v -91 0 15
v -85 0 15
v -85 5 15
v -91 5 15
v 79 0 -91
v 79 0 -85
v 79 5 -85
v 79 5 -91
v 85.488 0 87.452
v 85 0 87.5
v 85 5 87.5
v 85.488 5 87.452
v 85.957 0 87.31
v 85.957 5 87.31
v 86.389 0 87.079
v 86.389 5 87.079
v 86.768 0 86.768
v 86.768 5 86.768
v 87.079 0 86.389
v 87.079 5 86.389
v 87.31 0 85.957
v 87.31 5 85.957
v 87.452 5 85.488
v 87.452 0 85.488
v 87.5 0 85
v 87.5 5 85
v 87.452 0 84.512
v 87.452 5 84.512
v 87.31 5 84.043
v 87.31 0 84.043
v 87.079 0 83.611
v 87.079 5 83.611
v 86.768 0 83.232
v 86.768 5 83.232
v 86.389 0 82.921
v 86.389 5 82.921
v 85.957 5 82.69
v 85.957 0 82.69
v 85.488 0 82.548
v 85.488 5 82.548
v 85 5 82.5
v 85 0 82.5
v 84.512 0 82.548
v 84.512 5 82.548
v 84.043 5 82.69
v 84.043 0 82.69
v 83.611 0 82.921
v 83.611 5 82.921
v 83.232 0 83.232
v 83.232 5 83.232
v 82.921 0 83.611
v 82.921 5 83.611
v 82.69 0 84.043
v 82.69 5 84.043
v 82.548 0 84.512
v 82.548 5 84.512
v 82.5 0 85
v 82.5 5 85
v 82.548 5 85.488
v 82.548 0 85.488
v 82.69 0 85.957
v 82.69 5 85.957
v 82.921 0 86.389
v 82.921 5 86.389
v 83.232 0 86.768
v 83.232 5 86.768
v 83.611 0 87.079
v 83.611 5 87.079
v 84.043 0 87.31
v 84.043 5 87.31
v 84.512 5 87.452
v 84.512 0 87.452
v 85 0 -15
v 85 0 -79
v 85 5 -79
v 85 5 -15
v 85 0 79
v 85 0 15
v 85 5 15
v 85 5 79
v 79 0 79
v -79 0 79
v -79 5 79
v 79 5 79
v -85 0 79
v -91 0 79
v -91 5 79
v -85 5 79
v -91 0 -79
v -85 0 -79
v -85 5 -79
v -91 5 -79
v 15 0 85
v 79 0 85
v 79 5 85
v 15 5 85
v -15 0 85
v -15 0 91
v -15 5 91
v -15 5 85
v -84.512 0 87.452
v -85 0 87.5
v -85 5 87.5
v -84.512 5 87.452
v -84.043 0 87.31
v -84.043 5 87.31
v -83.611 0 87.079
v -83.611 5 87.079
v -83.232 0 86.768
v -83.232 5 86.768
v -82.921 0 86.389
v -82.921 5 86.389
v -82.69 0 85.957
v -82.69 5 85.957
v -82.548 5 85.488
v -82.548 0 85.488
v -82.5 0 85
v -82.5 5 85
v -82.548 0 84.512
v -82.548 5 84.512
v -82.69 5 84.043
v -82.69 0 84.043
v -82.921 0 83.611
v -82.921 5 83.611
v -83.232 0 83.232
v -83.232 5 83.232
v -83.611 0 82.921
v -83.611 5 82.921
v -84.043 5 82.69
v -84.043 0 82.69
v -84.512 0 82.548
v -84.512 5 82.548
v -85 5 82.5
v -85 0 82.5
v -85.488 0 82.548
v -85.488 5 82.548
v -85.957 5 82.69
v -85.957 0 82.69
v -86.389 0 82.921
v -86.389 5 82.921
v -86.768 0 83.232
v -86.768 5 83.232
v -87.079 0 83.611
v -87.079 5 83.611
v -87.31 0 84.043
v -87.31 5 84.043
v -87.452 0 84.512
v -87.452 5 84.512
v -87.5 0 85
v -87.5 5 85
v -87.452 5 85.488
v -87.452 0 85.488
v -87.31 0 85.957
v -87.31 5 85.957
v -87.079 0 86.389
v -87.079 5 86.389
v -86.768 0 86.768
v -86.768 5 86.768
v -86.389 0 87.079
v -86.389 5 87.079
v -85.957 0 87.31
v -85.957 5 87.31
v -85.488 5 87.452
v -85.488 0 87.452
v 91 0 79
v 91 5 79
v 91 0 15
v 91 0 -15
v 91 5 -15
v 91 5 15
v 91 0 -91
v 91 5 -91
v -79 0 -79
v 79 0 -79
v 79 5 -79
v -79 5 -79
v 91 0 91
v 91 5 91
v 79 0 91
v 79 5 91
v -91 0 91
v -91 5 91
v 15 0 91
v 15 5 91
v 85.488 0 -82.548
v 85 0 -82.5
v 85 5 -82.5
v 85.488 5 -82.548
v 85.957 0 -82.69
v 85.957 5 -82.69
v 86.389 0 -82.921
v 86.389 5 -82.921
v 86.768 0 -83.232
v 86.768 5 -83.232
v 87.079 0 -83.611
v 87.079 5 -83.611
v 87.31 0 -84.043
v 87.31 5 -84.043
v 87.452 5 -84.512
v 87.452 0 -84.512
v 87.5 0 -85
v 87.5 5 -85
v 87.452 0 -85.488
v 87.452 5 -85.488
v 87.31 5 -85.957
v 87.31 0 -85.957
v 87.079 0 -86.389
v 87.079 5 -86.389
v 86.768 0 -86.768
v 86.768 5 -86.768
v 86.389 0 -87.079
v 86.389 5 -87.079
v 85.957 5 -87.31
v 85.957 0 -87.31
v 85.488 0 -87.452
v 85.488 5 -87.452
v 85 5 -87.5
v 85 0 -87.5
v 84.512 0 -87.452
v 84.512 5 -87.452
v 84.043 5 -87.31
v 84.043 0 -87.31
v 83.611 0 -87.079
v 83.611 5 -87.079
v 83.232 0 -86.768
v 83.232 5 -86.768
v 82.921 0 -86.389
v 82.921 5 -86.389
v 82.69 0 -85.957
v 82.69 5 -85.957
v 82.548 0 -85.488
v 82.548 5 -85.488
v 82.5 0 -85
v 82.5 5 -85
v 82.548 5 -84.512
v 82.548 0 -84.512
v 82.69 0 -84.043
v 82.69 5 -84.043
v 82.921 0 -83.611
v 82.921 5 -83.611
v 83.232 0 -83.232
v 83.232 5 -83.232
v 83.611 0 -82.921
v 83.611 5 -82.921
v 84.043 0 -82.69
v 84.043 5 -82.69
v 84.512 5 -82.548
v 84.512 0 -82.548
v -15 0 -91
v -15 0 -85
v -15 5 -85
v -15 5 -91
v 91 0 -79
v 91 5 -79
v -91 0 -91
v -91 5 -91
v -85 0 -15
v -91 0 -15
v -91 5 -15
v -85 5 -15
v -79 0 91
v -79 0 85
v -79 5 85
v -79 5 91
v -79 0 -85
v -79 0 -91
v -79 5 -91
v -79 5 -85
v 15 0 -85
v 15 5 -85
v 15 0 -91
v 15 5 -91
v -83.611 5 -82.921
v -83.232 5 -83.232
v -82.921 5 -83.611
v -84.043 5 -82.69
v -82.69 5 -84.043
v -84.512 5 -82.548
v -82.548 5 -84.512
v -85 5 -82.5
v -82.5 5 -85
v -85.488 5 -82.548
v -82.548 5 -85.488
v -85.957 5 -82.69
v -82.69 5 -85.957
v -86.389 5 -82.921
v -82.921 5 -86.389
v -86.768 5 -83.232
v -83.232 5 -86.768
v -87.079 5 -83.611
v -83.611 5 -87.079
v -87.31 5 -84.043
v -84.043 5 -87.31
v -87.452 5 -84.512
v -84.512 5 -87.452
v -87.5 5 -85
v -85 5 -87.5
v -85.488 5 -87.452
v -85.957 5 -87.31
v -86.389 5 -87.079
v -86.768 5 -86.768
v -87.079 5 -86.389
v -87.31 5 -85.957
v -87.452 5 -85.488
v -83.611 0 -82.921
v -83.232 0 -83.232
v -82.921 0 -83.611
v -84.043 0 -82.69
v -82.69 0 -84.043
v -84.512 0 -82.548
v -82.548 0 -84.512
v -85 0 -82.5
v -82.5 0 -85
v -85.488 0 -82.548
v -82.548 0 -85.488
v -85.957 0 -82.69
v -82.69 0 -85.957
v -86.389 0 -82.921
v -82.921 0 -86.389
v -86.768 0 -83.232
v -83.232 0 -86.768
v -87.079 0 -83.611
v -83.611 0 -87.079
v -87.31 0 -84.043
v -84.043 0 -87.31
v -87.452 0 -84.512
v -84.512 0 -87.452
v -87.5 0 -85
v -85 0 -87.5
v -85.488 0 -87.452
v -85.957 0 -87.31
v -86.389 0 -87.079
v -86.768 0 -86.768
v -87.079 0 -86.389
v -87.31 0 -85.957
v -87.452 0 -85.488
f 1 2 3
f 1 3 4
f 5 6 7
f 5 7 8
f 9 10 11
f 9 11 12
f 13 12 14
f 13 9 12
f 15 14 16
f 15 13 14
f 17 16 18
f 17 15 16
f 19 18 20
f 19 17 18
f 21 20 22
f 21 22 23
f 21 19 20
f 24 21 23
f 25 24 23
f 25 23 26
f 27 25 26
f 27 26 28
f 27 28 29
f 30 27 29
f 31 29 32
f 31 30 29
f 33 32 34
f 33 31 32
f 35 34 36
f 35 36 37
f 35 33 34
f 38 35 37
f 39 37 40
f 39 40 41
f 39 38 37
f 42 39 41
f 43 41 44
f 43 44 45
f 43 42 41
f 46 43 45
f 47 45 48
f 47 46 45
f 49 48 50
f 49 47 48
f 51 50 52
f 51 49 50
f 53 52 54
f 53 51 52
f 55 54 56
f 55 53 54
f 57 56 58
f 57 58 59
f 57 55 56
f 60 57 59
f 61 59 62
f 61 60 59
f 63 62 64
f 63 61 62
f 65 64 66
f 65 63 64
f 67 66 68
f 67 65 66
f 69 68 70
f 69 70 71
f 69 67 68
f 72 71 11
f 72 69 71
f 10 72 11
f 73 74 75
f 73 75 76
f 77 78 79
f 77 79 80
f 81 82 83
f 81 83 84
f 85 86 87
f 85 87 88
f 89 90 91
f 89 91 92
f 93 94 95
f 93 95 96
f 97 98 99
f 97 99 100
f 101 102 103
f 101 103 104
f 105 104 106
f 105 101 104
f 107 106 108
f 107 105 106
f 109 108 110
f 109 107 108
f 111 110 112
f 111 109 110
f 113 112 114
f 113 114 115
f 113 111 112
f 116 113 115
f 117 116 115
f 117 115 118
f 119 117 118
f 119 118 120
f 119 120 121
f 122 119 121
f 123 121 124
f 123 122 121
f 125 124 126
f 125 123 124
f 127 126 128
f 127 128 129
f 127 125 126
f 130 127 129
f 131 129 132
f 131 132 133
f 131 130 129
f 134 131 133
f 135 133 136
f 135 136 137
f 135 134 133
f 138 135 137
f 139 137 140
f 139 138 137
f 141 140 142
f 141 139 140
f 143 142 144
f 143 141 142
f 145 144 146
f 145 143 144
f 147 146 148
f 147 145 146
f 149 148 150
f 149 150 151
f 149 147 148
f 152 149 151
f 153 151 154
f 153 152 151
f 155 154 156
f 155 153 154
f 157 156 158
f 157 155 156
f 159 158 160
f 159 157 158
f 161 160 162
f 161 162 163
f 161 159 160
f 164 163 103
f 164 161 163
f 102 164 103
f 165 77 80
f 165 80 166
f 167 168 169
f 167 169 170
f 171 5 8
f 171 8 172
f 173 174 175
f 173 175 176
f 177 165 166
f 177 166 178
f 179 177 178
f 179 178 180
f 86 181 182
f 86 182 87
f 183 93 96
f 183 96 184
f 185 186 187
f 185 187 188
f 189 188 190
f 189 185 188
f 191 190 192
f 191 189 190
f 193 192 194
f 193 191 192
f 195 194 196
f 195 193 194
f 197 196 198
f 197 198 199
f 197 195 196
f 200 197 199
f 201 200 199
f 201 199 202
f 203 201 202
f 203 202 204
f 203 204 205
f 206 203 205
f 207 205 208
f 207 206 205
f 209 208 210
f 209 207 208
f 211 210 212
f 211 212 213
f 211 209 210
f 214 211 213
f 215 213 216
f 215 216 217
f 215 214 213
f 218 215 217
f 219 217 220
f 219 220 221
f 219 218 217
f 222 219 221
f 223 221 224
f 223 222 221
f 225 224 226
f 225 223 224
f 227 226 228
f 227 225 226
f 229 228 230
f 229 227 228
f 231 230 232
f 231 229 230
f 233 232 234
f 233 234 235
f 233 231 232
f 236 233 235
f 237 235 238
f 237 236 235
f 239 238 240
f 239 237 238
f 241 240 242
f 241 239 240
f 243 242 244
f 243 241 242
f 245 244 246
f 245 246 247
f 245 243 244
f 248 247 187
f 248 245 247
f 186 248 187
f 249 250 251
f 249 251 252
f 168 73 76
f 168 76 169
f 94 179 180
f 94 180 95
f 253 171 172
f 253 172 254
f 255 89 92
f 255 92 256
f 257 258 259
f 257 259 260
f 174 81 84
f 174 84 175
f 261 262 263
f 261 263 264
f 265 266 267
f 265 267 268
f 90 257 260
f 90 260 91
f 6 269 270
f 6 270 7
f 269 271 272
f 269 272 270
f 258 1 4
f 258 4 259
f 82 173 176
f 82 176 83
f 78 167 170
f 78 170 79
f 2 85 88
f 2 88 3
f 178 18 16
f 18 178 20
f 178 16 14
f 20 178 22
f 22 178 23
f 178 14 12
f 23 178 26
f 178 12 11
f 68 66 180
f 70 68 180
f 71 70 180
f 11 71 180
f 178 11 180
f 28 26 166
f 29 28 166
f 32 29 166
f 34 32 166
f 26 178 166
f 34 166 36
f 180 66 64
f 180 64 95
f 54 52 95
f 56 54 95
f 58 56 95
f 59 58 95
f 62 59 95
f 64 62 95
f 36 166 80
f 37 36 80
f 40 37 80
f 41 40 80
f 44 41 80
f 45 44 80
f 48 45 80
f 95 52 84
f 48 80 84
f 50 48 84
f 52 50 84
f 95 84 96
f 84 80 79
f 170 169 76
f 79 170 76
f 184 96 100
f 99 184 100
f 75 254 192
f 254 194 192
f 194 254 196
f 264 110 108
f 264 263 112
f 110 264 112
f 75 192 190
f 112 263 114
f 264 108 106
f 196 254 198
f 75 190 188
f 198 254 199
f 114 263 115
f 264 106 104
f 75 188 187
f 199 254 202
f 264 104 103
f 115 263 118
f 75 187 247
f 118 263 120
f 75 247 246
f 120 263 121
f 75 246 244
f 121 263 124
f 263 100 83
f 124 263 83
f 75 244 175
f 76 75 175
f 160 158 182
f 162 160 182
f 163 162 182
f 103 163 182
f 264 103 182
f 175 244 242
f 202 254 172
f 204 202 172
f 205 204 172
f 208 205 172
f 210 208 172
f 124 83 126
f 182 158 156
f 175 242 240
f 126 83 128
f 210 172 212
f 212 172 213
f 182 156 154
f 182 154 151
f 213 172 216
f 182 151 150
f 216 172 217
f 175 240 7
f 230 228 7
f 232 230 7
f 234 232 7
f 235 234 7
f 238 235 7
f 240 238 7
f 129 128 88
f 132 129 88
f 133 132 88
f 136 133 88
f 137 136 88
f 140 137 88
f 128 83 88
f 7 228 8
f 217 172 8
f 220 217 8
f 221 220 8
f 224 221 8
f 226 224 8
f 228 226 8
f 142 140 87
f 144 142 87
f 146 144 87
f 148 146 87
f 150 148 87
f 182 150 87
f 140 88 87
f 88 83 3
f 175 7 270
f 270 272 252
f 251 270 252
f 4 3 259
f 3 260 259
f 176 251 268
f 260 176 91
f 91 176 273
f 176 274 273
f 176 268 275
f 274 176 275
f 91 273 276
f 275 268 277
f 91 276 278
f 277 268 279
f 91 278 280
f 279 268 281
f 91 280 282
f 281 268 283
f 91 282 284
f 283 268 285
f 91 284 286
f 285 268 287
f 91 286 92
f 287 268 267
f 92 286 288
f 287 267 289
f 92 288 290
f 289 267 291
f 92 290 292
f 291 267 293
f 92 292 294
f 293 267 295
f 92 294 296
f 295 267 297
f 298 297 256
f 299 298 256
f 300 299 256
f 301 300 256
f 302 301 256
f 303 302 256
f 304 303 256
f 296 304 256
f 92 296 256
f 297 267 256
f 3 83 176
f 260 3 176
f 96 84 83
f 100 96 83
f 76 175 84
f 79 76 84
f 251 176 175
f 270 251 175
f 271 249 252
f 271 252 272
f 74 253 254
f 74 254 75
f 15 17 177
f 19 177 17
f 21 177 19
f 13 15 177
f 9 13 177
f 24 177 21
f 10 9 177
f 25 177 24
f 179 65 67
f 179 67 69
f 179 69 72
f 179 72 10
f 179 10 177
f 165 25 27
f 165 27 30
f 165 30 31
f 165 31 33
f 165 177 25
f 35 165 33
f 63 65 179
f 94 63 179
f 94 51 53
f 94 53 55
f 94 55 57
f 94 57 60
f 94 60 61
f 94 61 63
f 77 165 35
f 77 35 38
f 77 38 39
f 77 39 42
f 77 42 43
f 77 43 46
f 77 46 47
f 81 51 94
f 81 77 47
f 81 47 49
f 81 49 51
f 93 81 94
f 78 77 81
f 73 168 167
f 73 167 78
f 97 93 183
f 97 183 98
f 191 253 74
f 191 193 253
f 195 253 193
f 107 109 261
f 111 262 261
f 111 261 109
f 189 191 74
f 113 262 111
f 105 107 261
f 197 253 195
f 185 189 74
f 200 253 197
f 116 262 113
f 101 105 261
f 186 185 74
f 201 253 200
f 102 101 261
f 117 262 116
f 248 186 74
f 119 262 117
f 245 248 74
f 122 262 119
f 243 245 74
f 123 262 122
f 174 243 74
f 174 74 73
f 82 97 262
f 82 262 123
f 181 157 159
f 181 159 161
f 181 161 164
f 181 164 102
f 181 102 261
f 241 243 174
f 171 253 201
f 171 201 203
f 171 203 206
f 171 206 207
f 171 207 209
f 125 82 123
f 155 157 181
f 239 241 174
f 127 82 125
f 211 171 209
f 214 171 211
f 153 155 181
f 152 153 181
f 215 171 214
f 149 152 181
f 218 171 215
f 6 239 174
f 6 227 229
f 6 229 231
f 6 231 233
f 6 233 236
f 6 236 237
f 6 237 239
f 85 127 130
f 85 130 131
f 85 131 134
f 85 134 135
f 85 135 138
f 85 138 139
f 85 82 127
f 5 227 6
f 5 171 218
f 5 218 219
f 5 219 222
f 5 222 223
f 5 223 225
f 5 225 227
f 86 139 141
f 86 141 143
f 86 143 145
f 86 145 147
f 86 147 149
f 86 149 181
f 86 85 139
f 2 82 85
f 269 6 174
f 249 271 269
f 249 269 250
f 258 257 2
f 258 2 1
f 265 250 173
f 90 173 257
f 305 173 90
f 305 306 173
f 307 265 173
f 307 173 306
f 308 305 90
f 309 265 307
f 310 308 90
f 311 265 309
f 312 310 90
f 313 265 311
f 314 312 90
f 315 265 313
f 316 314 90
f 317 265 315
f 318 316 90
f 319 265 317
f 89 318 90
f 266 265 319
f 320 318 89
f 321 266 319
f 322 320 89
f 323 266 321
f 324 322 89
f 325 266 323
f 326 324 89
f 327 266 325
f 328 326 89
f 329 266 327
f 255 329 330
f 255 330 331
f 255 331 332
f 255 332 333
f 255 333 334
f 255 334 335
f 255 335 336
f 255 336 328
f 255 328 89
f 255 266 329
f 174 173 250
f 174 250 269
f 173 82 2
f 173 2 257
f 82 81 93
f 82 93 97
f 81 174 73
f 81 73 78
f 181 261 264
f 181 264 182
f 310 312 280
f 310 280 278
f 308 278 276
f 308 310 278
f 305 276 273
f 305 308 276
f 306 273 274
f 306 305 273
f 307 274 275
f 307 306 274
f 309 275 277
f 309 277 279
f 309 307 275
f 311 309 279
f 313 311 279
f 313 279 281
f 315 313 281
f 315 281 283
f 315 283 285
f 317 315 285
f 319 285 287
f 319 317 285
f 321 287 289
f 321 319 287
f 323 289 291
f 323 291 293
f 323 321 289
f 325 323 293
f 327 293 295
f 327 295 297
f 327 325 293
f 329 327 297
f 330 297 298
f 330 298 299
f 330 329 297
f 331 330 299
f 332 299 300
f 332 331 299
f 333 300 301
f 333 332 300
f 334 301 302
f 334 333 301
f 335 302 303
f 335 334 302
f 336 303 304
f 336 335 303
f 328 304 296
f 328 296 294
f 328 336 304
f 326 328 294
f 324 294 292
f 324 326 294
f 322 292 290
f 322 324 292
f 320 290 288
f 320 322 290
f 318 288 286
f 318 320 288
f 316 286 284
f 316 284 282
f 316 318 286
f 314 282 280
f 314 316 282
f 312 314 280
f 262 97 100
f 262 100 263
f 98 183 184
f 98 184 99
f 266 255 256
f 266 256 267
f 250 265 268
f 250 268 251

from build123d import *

# Parameters (mm, degrees)
CROQUIS1_R              = 2.5
SALIENTE_EXTRUIR1_DEPTH = 5


with BuildPart() as part:
    # Croquis1 → Saliente-Extruir1 (new body)
    # profile 1 of 4: a face of its own
    with BuildSketch(Plane(origin=(0, 0, 0), x_dir=(1, 0, 0), z_dir=(0, 1, 0))):
        Polygon((0, 79), (0, 91), (15, 91), (15, 85), (79, 85), (79, 91), (91, 91), (91, 79), (85, 79), (85, 15), (91, 15), (91, 0), (79, 0), (79, 79), align=None)
        with Locations(Location((85, 85, 0), (0, 0, 270))):
            Circle(CROQUIS1_R, mode=Mode.SUBTRACT)
    # profile 2 of 4: a face of its own
    with BuildSketch(Plane(origin=(0, 0, 0), x_dir=(1, 0, 0), z_dir=(0, 1, 0))):
        Polygon((79, 0), (91, 0), (91, -15), (85, -15), (85, -79), (91, -79), (91, -91), (79, -91), (79, -85), (15, -85), (15, -91), (0, -91), (0, -79), (79, -79), align=None)
        with Locations(Location((85, -85, 0), (0, 0, 270))):
            Circle(CROQUIS1_R, mode=Mode.SUBTRACT)
    # profile 3 of 4: a face of its own
    with BuildSketch(Plane(origin=(0, 0, 0), x_dir=(1, 0, 0), z_dir=(0, 1, 0))):
        Polygon((0, -79), (0, -91), (-15, -91), (-15, -85), (-79, -85), (-79, -91), (-91, -91), (-91, -79), (-85, -79), (-85, -15), (-91, -15), (-91, 0), (-79, 0), (-79, -79), align=None)
        with Locations(Location((-85, -85, 0), (0, 0, 270))):
            Circle(CROQUIS1_R, mode=Mode.SUBTRACT)
    # profile 4 of 4: a face of its own
    with BuildSketch(Plane(origin=(0, 0, 0), x_dir=(1, 0, 0), z_dir=(0, 1, 0))):
        Polygon((0, 79), (-79, 79), (-79, 0), (-91, 0), (-91, 15), (-85, 15), (-85, 79), (-91, 79), (-91, 91), (-79, 91), (-79, 85), (-15, 85), (-15, 91), (0, 91), align=None)
        with Locations(Location((-85, 85, 0), (0, 0, 270))):
            Circle(CROQUIS1_R, mode=Mode.SUBTRACT)
    extrude(amount=SALIENTE_EXTRUIR1_DEPTH)


solid = part.part
